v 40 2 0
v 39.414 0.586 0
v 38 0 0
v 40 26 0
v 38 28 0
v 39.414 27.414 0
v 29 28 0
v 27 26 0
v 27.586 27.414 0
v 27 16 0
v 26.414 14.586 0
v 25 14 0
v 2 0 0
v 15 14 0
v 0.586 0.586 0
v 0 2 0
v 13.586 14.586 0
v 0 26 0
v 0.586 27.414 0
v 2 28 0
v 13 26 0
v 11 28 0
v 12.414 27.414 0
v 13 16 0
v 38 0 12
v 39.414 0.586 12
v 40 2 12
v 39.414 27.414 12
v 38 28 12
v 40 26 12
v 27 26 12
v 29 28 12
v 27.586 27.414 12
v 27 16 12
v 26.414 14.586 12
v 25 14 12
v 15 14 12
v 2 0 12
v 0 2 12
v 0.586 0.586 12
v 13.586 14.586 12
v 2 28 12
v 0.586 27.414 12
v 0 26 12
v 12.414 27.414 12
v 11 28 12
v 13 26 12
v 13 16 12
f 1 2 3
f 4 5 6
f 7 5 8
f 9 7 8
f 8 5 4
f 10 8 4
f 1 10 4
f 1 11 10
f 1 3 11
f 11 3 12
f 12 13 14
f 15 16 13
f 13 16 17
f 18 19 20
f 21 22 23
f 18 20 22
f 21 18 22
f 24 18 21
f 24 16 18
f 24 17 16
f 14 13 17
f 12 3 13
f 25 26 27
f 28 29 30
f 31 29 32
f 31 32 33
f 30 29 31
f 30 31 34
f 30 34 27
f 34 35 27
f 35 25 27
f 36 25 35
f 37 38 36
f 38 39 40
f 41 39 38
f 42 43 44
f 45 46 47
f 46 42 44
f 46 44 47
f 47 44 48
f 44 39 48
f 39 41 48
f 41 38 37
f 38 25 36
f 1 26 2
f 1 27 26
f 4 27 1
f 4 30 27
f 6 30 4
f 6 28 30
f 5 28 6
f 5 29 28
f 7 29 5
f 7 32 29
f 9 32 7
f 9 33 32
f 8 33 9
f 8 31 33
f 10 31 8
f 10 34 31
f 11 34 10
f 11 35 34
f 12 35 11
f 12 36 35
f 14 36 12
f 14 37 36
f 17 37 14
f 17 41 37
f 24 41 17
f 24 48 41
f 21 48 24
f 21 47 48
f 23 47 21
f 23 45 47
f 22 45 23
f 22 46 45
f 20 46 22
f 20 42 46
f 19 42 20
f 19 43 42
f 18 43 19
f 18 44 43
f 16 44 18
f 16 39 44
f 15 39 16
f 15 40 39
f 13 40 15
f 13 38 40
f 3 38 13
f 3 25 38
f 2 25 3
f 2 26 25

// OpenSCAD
$fn = 32;

// ----------------------------------------------------------------------
// Eye lug: clevis, 12 mm thick
// ----------------------------------------------------------------------

// --- parameters (mm) ---
profile_height = 12;      // extrusion height
profile_points = 24;      // points of the closed outline

profile = [[0, 2], [0.586, 0.586], [2, 0], [38, 0], [39.414, 0.586], [40, 2], [40, 26], [39.414, 27.414], [38, 28], [29, 28], [27.586, 27.414], [27, 26], [27, 16], [26.414, 14.586], [25, 14], [15, 14], [13.586, 14.586], [13, 16], [13, 26], [12.414, 27.414], [11, 28], [2, 28], [0.586, 27.414], [0, 26]];  // single closed polygon, 24 points, counter clockwise

// --- the one profile operation ---
linear_extrude(height = profile_height) polygon(points = profile);
